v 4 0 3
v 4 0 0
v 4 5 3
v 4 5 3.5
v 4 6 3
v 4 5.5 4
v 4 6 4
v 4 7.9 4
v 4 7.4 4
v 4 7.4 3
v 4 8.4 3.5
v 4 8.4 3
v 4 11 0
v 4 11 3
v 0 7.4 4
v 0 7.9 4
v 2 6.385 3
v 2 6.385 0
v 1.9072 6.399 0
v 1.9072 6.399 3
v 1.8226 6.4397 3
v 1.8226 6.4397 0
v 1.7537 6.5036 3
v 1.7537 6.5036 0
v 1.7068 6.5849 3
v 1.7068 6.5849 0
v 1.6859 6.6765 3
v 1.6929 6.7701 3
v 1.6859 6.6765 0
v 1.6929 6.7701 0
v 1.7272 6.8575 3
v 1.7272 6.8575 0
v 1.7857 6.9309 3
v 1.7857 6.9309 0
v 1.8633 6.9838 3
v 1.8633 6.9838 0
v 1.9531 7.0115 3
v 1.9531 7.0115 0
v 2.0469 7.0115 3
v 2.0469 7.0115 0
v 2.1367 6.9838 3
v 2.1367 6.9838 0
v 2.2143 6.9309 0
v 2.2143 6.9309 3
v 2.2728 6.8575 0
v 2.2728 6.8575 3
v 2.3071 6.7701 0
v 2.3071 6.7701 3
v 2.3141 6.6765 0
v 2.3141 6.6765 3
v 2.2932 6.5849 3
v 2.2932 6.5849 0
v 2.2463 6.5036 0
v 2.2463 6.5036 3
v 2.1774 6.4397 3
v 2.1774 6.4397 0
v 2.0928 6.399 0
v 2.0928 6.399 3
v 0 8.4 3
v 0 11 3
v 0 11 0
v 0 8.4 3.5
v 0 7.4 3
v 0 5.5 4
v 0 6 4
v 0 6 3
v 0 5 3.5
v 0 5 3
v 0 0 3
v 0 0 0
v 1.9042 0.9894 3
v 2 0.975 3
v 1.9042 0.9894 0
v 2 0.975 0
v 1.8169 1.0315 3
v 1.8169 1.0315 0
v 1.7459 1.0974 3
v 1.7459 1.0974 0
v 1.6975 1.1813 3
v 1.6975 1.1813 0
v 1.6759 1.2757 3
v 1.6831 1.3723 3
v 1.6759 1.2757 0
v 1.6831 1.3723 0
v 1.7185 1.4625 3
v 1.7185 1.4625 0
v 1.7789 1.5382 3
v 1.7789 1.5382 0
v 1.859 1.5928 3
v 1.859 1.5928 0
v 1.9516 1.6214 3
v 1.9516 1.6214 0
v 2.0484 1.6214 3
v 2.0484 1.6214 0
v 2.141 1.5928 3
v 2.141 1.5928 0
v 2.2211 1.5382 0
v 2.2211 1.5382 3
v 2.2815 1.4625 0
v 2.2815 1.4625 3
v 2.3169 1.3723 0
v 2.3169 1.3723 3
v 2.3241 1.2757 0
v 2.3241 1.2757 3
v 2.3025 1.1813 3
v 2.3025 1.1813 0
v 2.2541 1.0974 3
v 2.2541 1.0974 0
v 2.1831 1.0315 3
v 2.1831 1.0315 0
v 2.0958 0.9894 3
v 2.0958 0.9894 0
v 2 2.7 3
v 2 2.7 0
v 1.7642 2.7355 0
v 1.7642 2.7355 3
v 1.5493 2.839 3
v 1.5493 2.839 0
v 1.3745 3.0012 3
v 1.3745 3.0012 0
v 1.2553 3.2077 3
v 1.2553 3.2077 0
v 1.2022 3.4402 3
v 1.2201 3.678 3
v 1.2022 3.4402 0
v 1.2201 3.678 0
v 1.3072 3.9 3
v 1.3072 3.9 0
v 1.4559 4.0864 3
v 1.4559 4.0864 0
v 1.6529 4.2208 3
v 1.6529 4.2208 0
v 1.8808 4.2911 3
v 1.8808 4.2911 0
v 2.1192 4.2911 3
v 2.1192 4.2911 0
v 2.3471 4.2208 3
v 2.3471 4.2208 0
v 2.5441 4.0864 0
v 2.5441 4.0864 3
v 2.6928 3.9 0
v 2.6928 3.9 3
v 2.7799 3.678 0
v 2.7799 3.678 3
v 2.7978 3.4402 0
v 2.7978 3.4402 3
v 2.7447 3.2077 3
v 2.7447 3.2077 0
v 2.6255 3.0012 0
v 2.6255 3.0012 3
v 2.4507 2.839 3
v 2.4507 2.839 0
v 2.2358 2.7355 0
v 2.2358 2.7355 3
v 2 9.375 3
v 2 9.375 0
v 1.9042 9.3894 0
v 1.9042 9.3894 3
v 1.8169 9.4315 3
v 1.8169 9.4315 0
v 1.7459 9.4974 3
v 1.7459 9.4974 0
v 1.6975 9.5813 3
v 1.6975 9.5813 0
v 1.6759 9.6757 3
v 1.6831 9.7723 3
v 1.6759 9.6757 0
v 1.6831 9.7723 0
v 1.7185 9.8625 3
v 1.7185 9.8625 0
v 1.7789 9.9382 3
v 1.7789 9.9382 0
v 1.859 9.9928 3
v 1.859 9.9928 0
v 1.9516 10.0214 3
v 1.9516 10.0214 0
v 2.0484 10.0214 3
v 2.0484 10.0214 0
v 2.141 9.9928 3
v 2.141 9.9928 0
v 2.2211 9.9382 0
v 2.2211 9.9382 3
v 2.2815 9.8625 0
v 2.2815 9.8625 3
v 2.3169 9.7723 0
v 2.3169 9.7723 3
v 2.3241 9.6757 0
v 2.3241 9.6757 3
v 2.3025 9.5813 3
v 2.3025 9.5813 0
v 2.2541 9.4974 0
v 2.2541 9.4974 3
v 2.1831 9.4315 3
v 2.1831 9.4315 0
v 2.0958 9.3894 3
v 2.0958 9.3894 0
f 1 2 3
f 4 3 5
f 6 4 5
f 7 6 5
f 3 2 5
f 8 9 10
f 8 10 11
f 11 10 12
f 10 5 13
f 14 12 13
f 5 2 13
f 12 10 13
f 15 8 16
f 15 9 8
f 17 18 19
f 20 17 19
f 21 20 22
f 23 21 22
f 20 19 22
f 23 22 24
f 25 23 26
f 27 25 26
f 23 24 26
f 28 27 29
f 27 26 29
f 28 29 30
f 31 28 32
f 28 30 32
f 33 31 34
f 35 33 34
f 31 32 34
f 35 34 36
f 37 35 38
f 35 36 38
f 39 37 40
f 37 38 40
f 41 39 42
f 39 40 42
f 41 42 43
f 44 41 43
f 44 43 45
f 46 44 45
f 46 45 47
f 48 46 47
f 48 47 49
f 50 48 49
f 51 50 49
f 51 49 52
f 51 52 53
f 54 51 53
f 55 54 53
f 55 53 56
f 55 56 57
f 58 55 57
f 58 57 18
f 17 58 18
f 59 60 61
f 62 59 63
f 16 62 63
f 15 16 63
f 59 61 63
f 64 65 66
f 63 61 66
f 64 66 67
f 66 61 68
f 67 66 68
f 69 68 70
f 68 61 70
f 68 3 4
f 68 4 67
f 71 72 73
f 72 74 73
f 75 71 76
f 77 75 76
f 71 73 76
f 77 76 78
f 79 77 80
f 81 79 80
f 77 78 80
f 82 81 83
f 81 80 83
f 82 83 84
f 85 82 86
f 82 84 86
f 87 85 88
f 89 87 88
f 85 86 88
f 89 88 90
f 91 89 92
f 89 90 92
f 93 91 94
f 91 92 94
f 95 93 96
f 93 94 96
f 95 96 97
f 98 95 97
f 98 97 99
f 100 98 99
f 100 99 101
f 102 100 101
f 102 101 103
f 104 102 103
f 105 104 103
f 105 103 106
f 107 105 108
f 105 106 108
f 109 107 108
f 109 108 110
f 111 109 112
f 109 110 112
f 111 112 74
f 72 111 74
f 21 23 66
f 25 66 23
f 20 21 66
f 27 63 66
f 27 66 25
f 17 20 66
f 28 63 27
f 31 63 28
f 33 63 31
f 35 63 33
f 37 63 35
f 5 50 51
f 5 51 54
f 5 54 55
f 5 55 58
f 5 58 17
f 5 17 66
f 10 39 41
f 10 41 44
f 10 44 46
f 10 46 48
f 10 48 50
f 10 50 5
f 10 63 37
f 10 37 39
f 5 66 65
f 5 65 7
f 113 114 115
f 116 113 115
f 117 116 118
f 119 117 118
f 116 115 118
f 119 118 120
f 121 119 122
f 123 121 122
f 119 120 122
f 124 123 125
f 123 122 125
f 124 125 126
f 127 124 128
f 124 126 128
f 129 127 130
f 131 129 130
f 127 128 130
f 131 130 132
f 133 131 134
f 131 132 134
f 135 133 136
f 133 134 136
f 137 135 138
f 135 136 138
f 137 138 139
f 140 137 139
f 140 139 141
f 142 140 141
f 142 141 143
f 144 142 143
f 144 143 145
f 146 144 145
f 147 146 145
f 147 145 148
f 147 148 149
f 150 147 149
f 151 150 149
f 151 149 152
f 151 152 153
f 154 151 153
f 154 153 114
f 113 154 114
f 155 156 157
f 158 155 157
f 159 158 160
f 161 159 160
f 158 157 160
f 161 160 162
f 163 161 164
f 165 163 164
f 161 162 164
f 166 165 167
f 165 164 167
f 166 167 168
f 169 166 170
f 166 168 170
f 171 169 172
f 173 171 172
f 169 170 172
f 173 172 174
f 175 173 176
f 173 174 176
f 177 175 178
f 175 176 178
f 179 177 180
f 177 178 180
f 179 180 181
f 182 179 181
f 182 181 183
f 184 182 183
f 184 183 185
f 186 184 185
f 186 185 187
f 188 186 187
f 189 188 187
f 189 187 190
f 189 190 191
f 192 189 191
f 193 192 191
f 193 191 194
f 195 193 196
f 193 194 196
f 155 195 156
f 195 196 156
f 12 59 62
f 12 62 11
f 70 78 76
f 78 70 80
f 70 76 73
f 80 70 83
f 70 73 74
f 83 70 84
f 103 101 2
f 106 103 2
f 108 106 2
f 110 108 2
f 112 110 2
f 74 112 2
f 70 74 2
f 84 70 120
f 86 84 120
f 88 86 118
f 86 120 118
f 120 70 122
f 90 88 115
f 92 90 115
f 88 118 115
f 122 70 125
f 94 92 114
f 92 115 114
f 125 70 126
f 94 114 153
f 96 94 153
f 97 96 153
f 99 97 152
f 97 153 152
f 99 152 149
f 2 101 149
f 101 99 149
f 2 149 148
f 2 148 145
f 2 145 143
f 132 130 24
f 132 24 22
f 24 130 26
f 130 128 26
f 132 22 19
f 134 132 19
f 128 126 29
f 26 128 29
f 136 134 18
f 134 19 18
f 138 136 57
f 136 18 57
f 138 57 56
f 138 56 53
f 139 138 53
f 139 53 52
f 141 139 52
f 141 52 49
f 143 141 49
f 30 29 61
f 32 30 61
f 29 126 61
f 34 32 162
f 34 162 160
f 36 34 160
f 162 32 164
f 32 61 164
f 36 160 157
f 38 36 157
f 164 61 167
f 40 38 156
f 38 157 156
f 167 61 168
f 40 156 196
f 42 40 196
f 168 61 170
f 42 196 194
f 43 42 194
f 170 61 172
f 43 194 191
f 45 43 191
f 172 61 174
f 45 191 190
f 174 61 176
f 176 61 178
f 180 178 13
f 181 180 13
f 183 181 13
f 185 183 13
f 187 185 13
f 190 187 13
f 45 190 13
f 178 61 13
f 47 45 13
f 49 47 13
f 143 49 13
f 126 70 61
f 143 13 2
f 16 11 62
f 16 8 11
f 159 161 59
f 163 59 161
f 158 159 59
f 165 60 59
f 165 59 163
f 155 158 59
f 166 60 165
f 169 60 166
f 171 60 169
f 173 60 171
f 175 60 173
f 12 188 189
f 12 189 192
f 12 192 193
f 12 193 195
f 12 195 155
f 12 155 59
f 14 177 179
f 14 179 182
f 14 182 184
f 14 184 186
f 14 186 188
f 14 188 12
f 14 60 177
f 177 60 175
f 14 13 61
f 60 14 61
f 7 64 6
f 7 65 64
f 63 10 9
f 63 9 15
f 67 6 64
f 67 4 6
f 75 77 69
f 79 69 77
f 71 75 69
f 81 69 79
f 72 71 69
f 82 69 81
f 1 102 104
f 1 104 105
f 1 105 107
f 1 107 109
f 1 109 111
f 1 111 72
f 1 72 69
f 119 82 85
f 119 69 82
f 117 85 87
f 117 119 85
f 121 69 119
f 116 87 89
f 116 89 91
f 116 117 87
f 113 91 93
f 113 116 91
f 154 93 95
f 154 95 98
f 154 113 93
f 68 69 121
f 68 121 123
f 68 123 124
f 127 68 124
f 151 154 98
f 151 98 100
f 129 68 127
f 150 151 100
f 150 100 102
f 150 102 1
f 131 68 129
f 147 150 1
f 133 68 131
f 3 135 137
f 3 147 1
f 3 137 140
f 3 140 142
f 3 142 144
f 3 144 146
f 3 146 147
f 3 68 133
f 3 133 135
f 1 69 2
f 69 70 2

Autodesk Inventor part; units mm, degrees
ref_plane "YZ Plane" through (0, 0, 0) normal (1, 0, 0) x (0, 1, 0)
ref_plane "XZ Plane" through (0, 0, 0) normal (0, 1, 0) x (-1, 0, 0)
ref_plane "XY Plane" through (0, 0, 0) normal (0, 0, 1) x (1, 0, 0)
sketch "스케치1" plane through (0, 0, 0) normal (0, 0, 1) x (1, 0, 0)
  line L0 (0, 0) -> (4, 0)
  line L1 (4, 0) -> (4, 11)
  line L2 (4, 11) -> (0, 11)
  line L3 (0, 11) -> (0, 0)
  dimension "d0" = 4
  dimension "d1" = 11
extrude "돌출1" add sketch "스케치1" along normal blind 3
sketch "스케치2" plane through (0, 0, 3) normal (0, 0, 1) x (1, 0, 0)
  line L0 (4, 11) -> (0, 11) construction
  line L1 (2, 11) -> (2, 0) construction
  line L2 (0, 0) -> (4, 0) construction
  line L3 (0, 6) -> (4, 6)
  line L4 (4, 6) -> (4, 5)
  line L5 (4, 5) -> (0, 5)
  line L6 (0, 5) -> (0, 6)
  line L7 (4, 0) -> (4, 11) projected
  line L8 (0, 11) -> (0, 0) projected
  point P0 (2, 6.7)
  point P1 (2, 3.5)
  point P2 (2, 1.3)
  point P3 (2, 6.7)
  point P4 (2, 9.7)
  dimension "d7" = 1
  dimension "d8" = 5
  dimension "d9" = 4.3
  dimension "d45" = 1.3
  dimension "d51" = 3.2
  dimension "d52" = 2.2
  dimension "d54" = 0
  dimension "d55" = 1.3
extrude "돌출2" add sketch "스케치2" along normal blind 1
hole "구멍1" at (2, 6.7, 3) direction (0, 0, -1) diameter 0.63 end through all
hole "구멍2" at (2, 3.5, 3) direction (0, 0, -1) diameter 1.6 end through all
hole "구멍3" at (2, 1.3, 3) at (2, 9.7, 3) direction (0, 0, -1) diameter 0.65 end through all
chamfer "모따기1" distance 0.5 angle 45 1 edges at (2, 5, 4)
ref_plane "작업 평면1" through (0, 6.7, 3) normal (0, 1, 0) x (1, 0, 0)
mirror "미러1" about plane through (0, 6.7, 3) normal (0, 1, 0) of "돌출2", "모따기1"
equation "\"G23_M\" = 0.67"
equation "\"G23_F\" = 0.65"
properties part number "_3D 인쇄"
